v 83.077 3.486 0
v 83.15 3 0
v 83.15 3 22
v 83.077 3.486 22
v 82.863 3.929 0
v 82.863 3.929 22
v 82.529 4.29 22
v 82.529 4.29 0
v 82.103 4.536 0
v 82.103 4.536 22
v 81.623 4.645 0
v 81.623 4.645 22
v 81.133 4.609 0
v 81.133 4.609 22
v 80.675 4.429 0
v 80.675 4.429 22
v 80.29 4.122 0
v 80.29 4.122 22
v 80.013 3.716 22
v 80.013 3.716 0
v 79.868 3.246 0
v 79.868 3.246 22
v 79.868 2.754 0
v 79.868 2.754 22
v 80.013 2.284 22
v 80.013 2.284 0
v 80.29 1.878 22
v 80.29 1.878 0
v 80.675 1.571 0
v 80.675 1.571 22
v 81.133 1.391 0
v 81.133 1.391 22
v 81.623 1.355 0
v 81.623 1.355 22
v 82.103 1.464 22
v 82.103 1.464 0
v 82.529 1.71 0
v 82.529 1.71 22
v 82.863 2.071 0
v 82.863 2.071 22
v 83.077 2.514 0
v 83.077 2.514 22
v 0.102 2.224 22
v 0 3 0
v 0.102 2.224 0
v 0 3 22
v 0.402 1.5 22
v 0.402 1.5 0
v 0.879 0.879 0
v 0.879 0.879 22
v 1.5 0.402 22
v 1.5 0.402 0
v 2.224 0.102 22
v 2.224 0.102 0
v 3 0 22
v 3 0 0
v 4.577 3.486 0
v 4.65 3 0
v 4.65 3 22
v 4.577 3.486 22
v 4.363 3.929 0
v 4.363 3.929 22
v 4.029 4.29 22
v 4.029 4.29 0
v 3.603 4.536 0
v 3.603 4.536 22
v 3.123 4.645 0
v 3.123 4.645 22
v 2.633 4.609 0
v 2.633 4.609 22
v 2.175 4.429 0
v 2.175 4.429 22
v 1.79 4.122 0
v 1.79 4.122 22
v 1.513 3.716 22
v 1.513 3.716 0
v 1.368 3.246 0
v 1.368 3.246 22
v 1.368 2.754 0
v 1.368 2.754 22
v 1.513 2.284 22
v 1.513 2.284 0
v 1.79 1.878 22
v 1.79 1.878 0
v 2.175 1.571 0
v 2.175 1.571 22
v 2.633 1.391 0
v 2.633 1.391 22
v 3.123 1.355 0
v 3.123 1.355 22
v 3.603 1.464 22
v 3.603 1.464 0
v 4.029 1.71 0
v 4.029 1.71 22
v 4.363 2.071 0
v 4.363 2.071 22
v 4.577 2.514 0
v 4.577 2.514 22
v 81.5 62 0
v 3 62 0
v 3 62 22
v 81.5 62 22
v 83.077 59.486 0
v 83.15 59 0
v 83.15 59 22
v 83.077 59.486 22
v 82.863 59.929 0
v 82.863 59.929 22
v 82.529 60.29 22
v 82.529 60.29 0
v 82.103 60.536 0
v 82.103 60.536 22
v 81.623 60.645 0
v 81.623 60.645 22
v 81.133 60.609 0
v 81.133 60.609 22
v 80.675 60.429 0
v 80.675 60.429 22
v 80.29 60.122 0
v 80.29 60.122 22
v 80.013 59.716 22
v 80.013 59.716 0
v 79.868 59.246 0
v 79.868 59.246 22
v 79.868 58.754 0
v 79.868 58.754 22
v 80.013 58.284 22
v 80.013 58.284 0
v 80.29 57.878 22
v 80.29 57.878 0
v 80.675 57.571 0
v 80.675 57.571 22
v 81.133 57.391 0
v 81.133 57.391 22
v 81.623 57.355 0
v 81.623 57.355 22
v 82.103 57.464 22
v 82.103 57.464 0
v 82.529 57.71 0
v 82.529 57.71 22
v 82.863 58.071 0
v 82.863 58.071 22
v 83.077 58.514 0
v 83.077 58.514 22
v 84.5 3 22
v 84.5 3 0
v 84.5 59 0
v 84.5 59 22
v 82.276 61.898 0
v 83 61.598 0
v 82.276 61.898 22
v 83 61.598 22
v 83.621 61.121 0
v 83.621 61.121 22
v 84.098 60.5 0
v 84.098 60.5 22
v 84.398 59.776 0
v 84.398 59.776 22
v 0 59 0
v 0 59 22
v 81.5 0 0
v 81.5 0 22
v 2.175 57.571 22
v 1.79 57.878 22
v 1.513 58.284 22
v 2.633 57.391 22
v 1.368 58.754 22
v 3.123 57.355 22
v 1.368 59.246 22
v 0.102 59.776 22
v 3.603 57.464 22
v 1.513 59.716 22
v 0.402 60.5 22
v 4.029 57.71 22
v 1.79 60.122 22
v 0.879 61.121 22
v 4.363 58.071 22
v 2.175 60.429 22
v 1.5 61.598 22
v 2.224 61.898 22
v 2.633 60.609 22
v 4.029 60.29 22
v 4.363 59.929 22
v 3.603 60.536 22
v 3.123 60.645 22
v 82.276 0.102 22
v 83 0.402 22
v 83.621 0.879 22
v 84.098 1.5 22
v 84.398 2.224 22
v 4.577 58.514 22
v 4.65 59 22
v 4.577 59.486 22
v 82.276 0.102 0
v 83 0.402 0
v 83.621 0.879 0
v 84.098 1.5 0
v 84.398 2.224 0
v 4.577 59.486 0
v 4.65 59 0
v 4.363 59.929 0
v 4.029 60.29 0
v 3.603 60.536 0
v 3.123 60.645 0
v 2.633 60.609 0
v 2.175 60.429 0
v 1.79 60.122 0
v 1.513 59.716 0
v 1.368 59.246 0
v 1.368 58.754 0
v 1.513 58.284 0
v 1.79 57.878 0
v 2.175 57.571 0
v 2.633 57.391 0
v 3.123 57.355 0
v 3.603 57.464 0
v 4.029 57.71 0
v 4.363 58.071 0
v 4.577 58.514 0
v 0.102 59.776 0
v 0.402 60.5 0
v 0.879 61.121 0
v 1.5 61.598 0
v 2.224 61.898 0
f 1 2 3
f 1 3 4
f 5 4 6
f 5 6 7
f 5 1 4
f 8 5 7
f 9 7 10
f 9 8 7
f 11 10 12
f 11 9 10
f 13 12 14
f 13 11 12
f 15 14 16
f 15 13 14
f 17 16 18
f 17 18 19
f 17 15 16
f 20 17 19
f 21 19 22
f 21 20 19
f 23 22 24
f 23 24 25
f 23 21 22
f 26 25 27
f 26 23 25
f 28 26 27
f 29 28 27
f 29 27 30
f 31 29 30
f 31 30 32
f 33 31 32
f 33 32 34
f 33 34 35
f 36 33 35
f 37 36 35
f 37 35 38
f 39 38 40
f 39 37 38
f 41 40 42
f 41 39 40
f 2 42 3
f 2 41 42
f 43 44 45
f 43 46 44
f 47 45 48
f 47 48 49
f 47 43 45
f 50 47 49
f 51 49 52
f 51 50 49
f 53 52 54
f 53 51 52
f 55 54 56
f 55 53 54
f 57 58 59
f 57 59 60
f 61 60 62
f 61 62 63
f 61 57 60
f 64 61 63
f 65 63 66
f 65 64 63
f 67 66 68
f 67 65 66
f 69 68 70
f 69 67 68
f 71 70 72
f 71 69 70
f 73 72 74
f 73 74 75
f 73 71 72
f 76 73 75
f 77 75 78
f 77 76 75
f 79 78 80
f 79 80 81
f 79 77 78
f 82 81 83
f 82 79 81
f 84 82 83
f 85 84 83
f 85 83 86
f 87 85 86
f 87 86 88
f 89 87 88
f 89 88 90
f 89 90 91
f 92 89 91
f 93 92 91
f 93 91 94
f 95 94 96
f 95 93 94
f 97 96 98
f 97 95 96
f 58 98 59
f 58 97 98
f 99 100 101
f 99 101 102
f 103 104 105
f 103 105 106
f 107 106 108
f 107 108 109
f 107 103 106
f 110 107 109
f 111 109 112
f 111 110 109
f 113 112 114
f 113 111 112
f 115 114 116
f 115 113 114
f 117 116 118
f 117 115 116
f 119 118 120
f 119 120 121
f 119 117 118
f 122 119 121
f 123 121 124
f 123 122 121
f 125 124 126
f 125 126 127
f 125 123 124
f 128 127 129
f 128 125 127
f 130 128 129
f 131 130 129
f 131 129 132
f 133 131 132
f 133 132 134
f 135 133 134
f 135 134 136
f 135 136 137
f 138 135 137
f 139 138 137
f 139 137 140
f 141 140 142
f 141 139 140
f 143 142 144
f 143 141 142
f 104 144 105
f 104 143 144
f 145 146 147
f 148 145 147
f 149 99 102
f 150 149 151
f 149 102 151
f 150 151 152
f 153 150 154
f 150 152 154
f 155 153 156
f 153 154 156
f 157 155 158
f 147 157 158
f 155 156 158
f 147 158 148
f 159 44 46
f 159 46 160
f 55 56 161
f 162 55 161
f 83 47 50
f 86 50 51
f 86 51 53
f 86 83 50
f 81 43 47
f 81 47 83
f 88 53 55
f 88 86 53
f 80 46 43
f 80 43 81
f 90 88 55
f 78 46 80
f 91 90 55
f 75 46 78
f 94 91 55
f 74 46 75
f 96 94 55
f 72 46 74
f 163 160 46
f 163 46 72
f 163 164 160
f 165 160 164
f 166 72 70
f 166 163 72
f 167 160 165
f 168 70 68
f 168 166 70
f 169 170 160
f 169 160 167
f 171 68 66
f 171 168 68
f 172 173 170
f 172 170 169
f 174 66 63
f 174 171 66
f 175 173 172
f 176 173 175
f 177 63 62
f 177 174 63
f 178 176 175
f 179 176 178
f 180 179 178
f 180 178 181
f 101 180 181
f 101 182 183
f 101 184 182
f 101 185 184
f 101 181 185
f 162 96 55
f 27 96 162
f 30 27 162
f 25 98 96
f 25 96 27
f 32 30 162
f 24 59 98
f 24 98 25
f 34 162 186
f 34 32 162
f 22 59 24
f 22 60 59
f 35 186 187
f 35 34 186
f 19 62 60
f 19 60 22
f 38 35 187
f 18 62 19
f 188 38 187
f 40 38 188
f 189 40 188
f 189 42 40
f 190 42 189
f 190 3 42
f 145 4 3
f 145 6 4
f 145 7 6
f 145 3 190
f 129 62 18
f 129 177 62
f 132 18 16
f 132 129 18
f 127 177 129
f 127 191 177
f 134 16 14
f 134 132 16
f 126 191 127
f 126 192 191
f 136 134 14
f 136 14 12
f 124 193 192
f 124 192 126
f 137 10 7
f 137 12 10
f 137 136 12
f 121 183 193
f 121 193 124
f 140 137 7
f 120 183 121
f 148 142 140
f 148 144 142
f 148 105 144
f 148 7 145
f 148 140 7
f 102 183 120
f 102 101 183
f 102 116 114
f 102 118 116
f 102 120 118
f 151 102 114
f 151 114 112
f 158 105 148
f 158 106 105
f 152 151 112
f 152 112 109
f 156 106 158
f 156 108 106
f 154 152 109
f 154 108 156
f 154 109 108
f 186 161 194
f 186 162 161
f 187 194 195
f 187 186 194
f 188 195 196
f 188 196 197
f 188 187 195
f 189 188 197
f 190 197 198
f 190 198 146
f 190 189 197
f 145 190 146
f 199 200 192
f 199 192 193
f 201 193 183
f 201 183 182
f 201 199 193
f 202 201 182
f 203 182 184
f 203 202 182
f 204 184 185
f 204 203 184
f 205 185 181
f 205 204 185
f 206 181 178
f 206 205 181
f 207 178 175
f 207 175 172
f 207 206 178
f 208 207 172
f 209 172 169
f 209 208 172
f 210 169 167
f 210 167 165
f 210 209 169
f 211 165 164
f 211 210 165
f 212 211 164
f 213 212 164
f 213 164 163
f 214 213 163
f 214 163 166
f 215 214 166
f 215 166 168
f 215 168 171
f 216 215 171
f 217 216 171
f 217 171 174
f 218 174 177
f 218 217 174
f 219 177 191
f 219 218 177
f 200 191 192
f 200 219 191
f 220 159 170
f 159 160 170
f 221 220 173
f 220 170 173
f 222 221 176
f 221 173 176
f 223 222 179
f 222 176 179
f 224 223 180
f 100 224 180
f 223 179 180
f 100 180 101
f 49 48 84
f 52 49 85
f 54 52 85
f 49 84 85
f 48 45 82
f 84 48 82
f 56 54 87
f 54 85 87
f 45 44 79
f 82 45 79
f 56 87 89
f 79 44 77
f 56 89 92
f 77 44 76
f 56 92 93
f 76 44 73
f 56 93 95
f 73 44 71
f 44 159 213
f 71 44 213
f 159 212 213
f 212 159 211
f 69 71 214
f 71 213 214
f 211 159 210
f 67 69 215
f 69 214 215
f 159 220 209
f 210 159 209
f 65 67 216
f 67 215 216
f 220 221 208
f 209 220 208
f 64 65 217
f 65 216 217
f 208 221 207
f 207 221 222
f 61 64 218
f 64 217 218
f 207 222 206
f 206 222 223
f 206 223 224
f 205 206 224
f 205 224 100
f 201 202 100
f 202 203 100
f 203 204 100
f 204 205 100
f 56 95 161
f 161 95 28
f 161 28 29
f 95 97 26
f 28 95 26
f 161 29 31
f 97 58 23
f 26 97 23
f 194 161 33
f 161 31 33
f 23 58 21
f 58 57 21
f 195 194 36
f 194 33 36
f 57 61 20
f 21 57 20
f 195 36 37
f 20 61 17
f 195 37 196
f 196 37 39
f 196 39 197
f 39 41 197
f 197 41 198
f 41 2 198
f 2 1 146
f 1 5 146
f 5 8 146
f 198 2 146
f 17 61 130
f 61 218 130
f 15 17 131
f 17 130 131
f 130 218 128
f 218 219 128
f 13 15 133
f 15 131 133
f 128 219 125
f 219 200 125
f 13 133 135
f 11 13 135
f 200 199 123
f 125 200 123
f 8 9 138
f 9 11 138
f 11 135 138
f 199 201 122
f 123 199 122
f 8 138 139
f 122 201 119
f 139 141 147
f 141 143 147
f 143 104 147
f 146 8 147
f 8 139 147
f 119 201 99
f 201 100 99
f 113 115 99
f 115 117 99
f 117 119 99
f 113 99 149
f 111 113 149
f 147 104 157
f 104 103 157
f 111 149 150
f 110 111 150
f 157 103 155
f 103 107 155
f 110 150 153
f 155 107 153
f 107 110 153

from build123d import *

# Parameters (mm, degrees)
CROQUIS1_W              = 84.5
CROQUIS1_H              = 62
CROQUIS1_R              = 1.65
SALIENTE_EXTRUIR1_DEPTH = 22
REDONDEO1_R             = 3


with BuildPart() as part:
    # Croquis1 → Saliente-Extruir1 (new body)
    with BuildSketch(Plane.XY):
        with Locations((42.25, 31)):
            Rectangle(CROQUIS1_W, CROQUIS1_H)
        with Locations((3, 3)):
            Circle(CROQUIS1_R, mode=Mode.SUBTRACT)
        with Locations((81.5, 3)):
            Circle(CROQUIS1_R, mode=Mode.SUBTRACT)
        with Locations((81.5, 59)):
            Circle(CROQUIS1_R, mode=Mode.SUBTRACT)
        with Locations((3, 59)):
            Circle(CROQUIS1_R, mode=Mode.SUBTRACT)
    extrude(amount=SALIENTE_EXTRUIR1_DEPTH)

    # Redondeo1
    redondeo1_edges = [part.edges().sort_by_distance(p)[0] for p in [
        (0, 62, 11),
        (84.5, 62, 11),
        (84.5, 0, 11),
        (0, 0, 11),
    ]]
    fillet(redondeo1_edges, radius=REDONDEO1_R)


solid = part.part
